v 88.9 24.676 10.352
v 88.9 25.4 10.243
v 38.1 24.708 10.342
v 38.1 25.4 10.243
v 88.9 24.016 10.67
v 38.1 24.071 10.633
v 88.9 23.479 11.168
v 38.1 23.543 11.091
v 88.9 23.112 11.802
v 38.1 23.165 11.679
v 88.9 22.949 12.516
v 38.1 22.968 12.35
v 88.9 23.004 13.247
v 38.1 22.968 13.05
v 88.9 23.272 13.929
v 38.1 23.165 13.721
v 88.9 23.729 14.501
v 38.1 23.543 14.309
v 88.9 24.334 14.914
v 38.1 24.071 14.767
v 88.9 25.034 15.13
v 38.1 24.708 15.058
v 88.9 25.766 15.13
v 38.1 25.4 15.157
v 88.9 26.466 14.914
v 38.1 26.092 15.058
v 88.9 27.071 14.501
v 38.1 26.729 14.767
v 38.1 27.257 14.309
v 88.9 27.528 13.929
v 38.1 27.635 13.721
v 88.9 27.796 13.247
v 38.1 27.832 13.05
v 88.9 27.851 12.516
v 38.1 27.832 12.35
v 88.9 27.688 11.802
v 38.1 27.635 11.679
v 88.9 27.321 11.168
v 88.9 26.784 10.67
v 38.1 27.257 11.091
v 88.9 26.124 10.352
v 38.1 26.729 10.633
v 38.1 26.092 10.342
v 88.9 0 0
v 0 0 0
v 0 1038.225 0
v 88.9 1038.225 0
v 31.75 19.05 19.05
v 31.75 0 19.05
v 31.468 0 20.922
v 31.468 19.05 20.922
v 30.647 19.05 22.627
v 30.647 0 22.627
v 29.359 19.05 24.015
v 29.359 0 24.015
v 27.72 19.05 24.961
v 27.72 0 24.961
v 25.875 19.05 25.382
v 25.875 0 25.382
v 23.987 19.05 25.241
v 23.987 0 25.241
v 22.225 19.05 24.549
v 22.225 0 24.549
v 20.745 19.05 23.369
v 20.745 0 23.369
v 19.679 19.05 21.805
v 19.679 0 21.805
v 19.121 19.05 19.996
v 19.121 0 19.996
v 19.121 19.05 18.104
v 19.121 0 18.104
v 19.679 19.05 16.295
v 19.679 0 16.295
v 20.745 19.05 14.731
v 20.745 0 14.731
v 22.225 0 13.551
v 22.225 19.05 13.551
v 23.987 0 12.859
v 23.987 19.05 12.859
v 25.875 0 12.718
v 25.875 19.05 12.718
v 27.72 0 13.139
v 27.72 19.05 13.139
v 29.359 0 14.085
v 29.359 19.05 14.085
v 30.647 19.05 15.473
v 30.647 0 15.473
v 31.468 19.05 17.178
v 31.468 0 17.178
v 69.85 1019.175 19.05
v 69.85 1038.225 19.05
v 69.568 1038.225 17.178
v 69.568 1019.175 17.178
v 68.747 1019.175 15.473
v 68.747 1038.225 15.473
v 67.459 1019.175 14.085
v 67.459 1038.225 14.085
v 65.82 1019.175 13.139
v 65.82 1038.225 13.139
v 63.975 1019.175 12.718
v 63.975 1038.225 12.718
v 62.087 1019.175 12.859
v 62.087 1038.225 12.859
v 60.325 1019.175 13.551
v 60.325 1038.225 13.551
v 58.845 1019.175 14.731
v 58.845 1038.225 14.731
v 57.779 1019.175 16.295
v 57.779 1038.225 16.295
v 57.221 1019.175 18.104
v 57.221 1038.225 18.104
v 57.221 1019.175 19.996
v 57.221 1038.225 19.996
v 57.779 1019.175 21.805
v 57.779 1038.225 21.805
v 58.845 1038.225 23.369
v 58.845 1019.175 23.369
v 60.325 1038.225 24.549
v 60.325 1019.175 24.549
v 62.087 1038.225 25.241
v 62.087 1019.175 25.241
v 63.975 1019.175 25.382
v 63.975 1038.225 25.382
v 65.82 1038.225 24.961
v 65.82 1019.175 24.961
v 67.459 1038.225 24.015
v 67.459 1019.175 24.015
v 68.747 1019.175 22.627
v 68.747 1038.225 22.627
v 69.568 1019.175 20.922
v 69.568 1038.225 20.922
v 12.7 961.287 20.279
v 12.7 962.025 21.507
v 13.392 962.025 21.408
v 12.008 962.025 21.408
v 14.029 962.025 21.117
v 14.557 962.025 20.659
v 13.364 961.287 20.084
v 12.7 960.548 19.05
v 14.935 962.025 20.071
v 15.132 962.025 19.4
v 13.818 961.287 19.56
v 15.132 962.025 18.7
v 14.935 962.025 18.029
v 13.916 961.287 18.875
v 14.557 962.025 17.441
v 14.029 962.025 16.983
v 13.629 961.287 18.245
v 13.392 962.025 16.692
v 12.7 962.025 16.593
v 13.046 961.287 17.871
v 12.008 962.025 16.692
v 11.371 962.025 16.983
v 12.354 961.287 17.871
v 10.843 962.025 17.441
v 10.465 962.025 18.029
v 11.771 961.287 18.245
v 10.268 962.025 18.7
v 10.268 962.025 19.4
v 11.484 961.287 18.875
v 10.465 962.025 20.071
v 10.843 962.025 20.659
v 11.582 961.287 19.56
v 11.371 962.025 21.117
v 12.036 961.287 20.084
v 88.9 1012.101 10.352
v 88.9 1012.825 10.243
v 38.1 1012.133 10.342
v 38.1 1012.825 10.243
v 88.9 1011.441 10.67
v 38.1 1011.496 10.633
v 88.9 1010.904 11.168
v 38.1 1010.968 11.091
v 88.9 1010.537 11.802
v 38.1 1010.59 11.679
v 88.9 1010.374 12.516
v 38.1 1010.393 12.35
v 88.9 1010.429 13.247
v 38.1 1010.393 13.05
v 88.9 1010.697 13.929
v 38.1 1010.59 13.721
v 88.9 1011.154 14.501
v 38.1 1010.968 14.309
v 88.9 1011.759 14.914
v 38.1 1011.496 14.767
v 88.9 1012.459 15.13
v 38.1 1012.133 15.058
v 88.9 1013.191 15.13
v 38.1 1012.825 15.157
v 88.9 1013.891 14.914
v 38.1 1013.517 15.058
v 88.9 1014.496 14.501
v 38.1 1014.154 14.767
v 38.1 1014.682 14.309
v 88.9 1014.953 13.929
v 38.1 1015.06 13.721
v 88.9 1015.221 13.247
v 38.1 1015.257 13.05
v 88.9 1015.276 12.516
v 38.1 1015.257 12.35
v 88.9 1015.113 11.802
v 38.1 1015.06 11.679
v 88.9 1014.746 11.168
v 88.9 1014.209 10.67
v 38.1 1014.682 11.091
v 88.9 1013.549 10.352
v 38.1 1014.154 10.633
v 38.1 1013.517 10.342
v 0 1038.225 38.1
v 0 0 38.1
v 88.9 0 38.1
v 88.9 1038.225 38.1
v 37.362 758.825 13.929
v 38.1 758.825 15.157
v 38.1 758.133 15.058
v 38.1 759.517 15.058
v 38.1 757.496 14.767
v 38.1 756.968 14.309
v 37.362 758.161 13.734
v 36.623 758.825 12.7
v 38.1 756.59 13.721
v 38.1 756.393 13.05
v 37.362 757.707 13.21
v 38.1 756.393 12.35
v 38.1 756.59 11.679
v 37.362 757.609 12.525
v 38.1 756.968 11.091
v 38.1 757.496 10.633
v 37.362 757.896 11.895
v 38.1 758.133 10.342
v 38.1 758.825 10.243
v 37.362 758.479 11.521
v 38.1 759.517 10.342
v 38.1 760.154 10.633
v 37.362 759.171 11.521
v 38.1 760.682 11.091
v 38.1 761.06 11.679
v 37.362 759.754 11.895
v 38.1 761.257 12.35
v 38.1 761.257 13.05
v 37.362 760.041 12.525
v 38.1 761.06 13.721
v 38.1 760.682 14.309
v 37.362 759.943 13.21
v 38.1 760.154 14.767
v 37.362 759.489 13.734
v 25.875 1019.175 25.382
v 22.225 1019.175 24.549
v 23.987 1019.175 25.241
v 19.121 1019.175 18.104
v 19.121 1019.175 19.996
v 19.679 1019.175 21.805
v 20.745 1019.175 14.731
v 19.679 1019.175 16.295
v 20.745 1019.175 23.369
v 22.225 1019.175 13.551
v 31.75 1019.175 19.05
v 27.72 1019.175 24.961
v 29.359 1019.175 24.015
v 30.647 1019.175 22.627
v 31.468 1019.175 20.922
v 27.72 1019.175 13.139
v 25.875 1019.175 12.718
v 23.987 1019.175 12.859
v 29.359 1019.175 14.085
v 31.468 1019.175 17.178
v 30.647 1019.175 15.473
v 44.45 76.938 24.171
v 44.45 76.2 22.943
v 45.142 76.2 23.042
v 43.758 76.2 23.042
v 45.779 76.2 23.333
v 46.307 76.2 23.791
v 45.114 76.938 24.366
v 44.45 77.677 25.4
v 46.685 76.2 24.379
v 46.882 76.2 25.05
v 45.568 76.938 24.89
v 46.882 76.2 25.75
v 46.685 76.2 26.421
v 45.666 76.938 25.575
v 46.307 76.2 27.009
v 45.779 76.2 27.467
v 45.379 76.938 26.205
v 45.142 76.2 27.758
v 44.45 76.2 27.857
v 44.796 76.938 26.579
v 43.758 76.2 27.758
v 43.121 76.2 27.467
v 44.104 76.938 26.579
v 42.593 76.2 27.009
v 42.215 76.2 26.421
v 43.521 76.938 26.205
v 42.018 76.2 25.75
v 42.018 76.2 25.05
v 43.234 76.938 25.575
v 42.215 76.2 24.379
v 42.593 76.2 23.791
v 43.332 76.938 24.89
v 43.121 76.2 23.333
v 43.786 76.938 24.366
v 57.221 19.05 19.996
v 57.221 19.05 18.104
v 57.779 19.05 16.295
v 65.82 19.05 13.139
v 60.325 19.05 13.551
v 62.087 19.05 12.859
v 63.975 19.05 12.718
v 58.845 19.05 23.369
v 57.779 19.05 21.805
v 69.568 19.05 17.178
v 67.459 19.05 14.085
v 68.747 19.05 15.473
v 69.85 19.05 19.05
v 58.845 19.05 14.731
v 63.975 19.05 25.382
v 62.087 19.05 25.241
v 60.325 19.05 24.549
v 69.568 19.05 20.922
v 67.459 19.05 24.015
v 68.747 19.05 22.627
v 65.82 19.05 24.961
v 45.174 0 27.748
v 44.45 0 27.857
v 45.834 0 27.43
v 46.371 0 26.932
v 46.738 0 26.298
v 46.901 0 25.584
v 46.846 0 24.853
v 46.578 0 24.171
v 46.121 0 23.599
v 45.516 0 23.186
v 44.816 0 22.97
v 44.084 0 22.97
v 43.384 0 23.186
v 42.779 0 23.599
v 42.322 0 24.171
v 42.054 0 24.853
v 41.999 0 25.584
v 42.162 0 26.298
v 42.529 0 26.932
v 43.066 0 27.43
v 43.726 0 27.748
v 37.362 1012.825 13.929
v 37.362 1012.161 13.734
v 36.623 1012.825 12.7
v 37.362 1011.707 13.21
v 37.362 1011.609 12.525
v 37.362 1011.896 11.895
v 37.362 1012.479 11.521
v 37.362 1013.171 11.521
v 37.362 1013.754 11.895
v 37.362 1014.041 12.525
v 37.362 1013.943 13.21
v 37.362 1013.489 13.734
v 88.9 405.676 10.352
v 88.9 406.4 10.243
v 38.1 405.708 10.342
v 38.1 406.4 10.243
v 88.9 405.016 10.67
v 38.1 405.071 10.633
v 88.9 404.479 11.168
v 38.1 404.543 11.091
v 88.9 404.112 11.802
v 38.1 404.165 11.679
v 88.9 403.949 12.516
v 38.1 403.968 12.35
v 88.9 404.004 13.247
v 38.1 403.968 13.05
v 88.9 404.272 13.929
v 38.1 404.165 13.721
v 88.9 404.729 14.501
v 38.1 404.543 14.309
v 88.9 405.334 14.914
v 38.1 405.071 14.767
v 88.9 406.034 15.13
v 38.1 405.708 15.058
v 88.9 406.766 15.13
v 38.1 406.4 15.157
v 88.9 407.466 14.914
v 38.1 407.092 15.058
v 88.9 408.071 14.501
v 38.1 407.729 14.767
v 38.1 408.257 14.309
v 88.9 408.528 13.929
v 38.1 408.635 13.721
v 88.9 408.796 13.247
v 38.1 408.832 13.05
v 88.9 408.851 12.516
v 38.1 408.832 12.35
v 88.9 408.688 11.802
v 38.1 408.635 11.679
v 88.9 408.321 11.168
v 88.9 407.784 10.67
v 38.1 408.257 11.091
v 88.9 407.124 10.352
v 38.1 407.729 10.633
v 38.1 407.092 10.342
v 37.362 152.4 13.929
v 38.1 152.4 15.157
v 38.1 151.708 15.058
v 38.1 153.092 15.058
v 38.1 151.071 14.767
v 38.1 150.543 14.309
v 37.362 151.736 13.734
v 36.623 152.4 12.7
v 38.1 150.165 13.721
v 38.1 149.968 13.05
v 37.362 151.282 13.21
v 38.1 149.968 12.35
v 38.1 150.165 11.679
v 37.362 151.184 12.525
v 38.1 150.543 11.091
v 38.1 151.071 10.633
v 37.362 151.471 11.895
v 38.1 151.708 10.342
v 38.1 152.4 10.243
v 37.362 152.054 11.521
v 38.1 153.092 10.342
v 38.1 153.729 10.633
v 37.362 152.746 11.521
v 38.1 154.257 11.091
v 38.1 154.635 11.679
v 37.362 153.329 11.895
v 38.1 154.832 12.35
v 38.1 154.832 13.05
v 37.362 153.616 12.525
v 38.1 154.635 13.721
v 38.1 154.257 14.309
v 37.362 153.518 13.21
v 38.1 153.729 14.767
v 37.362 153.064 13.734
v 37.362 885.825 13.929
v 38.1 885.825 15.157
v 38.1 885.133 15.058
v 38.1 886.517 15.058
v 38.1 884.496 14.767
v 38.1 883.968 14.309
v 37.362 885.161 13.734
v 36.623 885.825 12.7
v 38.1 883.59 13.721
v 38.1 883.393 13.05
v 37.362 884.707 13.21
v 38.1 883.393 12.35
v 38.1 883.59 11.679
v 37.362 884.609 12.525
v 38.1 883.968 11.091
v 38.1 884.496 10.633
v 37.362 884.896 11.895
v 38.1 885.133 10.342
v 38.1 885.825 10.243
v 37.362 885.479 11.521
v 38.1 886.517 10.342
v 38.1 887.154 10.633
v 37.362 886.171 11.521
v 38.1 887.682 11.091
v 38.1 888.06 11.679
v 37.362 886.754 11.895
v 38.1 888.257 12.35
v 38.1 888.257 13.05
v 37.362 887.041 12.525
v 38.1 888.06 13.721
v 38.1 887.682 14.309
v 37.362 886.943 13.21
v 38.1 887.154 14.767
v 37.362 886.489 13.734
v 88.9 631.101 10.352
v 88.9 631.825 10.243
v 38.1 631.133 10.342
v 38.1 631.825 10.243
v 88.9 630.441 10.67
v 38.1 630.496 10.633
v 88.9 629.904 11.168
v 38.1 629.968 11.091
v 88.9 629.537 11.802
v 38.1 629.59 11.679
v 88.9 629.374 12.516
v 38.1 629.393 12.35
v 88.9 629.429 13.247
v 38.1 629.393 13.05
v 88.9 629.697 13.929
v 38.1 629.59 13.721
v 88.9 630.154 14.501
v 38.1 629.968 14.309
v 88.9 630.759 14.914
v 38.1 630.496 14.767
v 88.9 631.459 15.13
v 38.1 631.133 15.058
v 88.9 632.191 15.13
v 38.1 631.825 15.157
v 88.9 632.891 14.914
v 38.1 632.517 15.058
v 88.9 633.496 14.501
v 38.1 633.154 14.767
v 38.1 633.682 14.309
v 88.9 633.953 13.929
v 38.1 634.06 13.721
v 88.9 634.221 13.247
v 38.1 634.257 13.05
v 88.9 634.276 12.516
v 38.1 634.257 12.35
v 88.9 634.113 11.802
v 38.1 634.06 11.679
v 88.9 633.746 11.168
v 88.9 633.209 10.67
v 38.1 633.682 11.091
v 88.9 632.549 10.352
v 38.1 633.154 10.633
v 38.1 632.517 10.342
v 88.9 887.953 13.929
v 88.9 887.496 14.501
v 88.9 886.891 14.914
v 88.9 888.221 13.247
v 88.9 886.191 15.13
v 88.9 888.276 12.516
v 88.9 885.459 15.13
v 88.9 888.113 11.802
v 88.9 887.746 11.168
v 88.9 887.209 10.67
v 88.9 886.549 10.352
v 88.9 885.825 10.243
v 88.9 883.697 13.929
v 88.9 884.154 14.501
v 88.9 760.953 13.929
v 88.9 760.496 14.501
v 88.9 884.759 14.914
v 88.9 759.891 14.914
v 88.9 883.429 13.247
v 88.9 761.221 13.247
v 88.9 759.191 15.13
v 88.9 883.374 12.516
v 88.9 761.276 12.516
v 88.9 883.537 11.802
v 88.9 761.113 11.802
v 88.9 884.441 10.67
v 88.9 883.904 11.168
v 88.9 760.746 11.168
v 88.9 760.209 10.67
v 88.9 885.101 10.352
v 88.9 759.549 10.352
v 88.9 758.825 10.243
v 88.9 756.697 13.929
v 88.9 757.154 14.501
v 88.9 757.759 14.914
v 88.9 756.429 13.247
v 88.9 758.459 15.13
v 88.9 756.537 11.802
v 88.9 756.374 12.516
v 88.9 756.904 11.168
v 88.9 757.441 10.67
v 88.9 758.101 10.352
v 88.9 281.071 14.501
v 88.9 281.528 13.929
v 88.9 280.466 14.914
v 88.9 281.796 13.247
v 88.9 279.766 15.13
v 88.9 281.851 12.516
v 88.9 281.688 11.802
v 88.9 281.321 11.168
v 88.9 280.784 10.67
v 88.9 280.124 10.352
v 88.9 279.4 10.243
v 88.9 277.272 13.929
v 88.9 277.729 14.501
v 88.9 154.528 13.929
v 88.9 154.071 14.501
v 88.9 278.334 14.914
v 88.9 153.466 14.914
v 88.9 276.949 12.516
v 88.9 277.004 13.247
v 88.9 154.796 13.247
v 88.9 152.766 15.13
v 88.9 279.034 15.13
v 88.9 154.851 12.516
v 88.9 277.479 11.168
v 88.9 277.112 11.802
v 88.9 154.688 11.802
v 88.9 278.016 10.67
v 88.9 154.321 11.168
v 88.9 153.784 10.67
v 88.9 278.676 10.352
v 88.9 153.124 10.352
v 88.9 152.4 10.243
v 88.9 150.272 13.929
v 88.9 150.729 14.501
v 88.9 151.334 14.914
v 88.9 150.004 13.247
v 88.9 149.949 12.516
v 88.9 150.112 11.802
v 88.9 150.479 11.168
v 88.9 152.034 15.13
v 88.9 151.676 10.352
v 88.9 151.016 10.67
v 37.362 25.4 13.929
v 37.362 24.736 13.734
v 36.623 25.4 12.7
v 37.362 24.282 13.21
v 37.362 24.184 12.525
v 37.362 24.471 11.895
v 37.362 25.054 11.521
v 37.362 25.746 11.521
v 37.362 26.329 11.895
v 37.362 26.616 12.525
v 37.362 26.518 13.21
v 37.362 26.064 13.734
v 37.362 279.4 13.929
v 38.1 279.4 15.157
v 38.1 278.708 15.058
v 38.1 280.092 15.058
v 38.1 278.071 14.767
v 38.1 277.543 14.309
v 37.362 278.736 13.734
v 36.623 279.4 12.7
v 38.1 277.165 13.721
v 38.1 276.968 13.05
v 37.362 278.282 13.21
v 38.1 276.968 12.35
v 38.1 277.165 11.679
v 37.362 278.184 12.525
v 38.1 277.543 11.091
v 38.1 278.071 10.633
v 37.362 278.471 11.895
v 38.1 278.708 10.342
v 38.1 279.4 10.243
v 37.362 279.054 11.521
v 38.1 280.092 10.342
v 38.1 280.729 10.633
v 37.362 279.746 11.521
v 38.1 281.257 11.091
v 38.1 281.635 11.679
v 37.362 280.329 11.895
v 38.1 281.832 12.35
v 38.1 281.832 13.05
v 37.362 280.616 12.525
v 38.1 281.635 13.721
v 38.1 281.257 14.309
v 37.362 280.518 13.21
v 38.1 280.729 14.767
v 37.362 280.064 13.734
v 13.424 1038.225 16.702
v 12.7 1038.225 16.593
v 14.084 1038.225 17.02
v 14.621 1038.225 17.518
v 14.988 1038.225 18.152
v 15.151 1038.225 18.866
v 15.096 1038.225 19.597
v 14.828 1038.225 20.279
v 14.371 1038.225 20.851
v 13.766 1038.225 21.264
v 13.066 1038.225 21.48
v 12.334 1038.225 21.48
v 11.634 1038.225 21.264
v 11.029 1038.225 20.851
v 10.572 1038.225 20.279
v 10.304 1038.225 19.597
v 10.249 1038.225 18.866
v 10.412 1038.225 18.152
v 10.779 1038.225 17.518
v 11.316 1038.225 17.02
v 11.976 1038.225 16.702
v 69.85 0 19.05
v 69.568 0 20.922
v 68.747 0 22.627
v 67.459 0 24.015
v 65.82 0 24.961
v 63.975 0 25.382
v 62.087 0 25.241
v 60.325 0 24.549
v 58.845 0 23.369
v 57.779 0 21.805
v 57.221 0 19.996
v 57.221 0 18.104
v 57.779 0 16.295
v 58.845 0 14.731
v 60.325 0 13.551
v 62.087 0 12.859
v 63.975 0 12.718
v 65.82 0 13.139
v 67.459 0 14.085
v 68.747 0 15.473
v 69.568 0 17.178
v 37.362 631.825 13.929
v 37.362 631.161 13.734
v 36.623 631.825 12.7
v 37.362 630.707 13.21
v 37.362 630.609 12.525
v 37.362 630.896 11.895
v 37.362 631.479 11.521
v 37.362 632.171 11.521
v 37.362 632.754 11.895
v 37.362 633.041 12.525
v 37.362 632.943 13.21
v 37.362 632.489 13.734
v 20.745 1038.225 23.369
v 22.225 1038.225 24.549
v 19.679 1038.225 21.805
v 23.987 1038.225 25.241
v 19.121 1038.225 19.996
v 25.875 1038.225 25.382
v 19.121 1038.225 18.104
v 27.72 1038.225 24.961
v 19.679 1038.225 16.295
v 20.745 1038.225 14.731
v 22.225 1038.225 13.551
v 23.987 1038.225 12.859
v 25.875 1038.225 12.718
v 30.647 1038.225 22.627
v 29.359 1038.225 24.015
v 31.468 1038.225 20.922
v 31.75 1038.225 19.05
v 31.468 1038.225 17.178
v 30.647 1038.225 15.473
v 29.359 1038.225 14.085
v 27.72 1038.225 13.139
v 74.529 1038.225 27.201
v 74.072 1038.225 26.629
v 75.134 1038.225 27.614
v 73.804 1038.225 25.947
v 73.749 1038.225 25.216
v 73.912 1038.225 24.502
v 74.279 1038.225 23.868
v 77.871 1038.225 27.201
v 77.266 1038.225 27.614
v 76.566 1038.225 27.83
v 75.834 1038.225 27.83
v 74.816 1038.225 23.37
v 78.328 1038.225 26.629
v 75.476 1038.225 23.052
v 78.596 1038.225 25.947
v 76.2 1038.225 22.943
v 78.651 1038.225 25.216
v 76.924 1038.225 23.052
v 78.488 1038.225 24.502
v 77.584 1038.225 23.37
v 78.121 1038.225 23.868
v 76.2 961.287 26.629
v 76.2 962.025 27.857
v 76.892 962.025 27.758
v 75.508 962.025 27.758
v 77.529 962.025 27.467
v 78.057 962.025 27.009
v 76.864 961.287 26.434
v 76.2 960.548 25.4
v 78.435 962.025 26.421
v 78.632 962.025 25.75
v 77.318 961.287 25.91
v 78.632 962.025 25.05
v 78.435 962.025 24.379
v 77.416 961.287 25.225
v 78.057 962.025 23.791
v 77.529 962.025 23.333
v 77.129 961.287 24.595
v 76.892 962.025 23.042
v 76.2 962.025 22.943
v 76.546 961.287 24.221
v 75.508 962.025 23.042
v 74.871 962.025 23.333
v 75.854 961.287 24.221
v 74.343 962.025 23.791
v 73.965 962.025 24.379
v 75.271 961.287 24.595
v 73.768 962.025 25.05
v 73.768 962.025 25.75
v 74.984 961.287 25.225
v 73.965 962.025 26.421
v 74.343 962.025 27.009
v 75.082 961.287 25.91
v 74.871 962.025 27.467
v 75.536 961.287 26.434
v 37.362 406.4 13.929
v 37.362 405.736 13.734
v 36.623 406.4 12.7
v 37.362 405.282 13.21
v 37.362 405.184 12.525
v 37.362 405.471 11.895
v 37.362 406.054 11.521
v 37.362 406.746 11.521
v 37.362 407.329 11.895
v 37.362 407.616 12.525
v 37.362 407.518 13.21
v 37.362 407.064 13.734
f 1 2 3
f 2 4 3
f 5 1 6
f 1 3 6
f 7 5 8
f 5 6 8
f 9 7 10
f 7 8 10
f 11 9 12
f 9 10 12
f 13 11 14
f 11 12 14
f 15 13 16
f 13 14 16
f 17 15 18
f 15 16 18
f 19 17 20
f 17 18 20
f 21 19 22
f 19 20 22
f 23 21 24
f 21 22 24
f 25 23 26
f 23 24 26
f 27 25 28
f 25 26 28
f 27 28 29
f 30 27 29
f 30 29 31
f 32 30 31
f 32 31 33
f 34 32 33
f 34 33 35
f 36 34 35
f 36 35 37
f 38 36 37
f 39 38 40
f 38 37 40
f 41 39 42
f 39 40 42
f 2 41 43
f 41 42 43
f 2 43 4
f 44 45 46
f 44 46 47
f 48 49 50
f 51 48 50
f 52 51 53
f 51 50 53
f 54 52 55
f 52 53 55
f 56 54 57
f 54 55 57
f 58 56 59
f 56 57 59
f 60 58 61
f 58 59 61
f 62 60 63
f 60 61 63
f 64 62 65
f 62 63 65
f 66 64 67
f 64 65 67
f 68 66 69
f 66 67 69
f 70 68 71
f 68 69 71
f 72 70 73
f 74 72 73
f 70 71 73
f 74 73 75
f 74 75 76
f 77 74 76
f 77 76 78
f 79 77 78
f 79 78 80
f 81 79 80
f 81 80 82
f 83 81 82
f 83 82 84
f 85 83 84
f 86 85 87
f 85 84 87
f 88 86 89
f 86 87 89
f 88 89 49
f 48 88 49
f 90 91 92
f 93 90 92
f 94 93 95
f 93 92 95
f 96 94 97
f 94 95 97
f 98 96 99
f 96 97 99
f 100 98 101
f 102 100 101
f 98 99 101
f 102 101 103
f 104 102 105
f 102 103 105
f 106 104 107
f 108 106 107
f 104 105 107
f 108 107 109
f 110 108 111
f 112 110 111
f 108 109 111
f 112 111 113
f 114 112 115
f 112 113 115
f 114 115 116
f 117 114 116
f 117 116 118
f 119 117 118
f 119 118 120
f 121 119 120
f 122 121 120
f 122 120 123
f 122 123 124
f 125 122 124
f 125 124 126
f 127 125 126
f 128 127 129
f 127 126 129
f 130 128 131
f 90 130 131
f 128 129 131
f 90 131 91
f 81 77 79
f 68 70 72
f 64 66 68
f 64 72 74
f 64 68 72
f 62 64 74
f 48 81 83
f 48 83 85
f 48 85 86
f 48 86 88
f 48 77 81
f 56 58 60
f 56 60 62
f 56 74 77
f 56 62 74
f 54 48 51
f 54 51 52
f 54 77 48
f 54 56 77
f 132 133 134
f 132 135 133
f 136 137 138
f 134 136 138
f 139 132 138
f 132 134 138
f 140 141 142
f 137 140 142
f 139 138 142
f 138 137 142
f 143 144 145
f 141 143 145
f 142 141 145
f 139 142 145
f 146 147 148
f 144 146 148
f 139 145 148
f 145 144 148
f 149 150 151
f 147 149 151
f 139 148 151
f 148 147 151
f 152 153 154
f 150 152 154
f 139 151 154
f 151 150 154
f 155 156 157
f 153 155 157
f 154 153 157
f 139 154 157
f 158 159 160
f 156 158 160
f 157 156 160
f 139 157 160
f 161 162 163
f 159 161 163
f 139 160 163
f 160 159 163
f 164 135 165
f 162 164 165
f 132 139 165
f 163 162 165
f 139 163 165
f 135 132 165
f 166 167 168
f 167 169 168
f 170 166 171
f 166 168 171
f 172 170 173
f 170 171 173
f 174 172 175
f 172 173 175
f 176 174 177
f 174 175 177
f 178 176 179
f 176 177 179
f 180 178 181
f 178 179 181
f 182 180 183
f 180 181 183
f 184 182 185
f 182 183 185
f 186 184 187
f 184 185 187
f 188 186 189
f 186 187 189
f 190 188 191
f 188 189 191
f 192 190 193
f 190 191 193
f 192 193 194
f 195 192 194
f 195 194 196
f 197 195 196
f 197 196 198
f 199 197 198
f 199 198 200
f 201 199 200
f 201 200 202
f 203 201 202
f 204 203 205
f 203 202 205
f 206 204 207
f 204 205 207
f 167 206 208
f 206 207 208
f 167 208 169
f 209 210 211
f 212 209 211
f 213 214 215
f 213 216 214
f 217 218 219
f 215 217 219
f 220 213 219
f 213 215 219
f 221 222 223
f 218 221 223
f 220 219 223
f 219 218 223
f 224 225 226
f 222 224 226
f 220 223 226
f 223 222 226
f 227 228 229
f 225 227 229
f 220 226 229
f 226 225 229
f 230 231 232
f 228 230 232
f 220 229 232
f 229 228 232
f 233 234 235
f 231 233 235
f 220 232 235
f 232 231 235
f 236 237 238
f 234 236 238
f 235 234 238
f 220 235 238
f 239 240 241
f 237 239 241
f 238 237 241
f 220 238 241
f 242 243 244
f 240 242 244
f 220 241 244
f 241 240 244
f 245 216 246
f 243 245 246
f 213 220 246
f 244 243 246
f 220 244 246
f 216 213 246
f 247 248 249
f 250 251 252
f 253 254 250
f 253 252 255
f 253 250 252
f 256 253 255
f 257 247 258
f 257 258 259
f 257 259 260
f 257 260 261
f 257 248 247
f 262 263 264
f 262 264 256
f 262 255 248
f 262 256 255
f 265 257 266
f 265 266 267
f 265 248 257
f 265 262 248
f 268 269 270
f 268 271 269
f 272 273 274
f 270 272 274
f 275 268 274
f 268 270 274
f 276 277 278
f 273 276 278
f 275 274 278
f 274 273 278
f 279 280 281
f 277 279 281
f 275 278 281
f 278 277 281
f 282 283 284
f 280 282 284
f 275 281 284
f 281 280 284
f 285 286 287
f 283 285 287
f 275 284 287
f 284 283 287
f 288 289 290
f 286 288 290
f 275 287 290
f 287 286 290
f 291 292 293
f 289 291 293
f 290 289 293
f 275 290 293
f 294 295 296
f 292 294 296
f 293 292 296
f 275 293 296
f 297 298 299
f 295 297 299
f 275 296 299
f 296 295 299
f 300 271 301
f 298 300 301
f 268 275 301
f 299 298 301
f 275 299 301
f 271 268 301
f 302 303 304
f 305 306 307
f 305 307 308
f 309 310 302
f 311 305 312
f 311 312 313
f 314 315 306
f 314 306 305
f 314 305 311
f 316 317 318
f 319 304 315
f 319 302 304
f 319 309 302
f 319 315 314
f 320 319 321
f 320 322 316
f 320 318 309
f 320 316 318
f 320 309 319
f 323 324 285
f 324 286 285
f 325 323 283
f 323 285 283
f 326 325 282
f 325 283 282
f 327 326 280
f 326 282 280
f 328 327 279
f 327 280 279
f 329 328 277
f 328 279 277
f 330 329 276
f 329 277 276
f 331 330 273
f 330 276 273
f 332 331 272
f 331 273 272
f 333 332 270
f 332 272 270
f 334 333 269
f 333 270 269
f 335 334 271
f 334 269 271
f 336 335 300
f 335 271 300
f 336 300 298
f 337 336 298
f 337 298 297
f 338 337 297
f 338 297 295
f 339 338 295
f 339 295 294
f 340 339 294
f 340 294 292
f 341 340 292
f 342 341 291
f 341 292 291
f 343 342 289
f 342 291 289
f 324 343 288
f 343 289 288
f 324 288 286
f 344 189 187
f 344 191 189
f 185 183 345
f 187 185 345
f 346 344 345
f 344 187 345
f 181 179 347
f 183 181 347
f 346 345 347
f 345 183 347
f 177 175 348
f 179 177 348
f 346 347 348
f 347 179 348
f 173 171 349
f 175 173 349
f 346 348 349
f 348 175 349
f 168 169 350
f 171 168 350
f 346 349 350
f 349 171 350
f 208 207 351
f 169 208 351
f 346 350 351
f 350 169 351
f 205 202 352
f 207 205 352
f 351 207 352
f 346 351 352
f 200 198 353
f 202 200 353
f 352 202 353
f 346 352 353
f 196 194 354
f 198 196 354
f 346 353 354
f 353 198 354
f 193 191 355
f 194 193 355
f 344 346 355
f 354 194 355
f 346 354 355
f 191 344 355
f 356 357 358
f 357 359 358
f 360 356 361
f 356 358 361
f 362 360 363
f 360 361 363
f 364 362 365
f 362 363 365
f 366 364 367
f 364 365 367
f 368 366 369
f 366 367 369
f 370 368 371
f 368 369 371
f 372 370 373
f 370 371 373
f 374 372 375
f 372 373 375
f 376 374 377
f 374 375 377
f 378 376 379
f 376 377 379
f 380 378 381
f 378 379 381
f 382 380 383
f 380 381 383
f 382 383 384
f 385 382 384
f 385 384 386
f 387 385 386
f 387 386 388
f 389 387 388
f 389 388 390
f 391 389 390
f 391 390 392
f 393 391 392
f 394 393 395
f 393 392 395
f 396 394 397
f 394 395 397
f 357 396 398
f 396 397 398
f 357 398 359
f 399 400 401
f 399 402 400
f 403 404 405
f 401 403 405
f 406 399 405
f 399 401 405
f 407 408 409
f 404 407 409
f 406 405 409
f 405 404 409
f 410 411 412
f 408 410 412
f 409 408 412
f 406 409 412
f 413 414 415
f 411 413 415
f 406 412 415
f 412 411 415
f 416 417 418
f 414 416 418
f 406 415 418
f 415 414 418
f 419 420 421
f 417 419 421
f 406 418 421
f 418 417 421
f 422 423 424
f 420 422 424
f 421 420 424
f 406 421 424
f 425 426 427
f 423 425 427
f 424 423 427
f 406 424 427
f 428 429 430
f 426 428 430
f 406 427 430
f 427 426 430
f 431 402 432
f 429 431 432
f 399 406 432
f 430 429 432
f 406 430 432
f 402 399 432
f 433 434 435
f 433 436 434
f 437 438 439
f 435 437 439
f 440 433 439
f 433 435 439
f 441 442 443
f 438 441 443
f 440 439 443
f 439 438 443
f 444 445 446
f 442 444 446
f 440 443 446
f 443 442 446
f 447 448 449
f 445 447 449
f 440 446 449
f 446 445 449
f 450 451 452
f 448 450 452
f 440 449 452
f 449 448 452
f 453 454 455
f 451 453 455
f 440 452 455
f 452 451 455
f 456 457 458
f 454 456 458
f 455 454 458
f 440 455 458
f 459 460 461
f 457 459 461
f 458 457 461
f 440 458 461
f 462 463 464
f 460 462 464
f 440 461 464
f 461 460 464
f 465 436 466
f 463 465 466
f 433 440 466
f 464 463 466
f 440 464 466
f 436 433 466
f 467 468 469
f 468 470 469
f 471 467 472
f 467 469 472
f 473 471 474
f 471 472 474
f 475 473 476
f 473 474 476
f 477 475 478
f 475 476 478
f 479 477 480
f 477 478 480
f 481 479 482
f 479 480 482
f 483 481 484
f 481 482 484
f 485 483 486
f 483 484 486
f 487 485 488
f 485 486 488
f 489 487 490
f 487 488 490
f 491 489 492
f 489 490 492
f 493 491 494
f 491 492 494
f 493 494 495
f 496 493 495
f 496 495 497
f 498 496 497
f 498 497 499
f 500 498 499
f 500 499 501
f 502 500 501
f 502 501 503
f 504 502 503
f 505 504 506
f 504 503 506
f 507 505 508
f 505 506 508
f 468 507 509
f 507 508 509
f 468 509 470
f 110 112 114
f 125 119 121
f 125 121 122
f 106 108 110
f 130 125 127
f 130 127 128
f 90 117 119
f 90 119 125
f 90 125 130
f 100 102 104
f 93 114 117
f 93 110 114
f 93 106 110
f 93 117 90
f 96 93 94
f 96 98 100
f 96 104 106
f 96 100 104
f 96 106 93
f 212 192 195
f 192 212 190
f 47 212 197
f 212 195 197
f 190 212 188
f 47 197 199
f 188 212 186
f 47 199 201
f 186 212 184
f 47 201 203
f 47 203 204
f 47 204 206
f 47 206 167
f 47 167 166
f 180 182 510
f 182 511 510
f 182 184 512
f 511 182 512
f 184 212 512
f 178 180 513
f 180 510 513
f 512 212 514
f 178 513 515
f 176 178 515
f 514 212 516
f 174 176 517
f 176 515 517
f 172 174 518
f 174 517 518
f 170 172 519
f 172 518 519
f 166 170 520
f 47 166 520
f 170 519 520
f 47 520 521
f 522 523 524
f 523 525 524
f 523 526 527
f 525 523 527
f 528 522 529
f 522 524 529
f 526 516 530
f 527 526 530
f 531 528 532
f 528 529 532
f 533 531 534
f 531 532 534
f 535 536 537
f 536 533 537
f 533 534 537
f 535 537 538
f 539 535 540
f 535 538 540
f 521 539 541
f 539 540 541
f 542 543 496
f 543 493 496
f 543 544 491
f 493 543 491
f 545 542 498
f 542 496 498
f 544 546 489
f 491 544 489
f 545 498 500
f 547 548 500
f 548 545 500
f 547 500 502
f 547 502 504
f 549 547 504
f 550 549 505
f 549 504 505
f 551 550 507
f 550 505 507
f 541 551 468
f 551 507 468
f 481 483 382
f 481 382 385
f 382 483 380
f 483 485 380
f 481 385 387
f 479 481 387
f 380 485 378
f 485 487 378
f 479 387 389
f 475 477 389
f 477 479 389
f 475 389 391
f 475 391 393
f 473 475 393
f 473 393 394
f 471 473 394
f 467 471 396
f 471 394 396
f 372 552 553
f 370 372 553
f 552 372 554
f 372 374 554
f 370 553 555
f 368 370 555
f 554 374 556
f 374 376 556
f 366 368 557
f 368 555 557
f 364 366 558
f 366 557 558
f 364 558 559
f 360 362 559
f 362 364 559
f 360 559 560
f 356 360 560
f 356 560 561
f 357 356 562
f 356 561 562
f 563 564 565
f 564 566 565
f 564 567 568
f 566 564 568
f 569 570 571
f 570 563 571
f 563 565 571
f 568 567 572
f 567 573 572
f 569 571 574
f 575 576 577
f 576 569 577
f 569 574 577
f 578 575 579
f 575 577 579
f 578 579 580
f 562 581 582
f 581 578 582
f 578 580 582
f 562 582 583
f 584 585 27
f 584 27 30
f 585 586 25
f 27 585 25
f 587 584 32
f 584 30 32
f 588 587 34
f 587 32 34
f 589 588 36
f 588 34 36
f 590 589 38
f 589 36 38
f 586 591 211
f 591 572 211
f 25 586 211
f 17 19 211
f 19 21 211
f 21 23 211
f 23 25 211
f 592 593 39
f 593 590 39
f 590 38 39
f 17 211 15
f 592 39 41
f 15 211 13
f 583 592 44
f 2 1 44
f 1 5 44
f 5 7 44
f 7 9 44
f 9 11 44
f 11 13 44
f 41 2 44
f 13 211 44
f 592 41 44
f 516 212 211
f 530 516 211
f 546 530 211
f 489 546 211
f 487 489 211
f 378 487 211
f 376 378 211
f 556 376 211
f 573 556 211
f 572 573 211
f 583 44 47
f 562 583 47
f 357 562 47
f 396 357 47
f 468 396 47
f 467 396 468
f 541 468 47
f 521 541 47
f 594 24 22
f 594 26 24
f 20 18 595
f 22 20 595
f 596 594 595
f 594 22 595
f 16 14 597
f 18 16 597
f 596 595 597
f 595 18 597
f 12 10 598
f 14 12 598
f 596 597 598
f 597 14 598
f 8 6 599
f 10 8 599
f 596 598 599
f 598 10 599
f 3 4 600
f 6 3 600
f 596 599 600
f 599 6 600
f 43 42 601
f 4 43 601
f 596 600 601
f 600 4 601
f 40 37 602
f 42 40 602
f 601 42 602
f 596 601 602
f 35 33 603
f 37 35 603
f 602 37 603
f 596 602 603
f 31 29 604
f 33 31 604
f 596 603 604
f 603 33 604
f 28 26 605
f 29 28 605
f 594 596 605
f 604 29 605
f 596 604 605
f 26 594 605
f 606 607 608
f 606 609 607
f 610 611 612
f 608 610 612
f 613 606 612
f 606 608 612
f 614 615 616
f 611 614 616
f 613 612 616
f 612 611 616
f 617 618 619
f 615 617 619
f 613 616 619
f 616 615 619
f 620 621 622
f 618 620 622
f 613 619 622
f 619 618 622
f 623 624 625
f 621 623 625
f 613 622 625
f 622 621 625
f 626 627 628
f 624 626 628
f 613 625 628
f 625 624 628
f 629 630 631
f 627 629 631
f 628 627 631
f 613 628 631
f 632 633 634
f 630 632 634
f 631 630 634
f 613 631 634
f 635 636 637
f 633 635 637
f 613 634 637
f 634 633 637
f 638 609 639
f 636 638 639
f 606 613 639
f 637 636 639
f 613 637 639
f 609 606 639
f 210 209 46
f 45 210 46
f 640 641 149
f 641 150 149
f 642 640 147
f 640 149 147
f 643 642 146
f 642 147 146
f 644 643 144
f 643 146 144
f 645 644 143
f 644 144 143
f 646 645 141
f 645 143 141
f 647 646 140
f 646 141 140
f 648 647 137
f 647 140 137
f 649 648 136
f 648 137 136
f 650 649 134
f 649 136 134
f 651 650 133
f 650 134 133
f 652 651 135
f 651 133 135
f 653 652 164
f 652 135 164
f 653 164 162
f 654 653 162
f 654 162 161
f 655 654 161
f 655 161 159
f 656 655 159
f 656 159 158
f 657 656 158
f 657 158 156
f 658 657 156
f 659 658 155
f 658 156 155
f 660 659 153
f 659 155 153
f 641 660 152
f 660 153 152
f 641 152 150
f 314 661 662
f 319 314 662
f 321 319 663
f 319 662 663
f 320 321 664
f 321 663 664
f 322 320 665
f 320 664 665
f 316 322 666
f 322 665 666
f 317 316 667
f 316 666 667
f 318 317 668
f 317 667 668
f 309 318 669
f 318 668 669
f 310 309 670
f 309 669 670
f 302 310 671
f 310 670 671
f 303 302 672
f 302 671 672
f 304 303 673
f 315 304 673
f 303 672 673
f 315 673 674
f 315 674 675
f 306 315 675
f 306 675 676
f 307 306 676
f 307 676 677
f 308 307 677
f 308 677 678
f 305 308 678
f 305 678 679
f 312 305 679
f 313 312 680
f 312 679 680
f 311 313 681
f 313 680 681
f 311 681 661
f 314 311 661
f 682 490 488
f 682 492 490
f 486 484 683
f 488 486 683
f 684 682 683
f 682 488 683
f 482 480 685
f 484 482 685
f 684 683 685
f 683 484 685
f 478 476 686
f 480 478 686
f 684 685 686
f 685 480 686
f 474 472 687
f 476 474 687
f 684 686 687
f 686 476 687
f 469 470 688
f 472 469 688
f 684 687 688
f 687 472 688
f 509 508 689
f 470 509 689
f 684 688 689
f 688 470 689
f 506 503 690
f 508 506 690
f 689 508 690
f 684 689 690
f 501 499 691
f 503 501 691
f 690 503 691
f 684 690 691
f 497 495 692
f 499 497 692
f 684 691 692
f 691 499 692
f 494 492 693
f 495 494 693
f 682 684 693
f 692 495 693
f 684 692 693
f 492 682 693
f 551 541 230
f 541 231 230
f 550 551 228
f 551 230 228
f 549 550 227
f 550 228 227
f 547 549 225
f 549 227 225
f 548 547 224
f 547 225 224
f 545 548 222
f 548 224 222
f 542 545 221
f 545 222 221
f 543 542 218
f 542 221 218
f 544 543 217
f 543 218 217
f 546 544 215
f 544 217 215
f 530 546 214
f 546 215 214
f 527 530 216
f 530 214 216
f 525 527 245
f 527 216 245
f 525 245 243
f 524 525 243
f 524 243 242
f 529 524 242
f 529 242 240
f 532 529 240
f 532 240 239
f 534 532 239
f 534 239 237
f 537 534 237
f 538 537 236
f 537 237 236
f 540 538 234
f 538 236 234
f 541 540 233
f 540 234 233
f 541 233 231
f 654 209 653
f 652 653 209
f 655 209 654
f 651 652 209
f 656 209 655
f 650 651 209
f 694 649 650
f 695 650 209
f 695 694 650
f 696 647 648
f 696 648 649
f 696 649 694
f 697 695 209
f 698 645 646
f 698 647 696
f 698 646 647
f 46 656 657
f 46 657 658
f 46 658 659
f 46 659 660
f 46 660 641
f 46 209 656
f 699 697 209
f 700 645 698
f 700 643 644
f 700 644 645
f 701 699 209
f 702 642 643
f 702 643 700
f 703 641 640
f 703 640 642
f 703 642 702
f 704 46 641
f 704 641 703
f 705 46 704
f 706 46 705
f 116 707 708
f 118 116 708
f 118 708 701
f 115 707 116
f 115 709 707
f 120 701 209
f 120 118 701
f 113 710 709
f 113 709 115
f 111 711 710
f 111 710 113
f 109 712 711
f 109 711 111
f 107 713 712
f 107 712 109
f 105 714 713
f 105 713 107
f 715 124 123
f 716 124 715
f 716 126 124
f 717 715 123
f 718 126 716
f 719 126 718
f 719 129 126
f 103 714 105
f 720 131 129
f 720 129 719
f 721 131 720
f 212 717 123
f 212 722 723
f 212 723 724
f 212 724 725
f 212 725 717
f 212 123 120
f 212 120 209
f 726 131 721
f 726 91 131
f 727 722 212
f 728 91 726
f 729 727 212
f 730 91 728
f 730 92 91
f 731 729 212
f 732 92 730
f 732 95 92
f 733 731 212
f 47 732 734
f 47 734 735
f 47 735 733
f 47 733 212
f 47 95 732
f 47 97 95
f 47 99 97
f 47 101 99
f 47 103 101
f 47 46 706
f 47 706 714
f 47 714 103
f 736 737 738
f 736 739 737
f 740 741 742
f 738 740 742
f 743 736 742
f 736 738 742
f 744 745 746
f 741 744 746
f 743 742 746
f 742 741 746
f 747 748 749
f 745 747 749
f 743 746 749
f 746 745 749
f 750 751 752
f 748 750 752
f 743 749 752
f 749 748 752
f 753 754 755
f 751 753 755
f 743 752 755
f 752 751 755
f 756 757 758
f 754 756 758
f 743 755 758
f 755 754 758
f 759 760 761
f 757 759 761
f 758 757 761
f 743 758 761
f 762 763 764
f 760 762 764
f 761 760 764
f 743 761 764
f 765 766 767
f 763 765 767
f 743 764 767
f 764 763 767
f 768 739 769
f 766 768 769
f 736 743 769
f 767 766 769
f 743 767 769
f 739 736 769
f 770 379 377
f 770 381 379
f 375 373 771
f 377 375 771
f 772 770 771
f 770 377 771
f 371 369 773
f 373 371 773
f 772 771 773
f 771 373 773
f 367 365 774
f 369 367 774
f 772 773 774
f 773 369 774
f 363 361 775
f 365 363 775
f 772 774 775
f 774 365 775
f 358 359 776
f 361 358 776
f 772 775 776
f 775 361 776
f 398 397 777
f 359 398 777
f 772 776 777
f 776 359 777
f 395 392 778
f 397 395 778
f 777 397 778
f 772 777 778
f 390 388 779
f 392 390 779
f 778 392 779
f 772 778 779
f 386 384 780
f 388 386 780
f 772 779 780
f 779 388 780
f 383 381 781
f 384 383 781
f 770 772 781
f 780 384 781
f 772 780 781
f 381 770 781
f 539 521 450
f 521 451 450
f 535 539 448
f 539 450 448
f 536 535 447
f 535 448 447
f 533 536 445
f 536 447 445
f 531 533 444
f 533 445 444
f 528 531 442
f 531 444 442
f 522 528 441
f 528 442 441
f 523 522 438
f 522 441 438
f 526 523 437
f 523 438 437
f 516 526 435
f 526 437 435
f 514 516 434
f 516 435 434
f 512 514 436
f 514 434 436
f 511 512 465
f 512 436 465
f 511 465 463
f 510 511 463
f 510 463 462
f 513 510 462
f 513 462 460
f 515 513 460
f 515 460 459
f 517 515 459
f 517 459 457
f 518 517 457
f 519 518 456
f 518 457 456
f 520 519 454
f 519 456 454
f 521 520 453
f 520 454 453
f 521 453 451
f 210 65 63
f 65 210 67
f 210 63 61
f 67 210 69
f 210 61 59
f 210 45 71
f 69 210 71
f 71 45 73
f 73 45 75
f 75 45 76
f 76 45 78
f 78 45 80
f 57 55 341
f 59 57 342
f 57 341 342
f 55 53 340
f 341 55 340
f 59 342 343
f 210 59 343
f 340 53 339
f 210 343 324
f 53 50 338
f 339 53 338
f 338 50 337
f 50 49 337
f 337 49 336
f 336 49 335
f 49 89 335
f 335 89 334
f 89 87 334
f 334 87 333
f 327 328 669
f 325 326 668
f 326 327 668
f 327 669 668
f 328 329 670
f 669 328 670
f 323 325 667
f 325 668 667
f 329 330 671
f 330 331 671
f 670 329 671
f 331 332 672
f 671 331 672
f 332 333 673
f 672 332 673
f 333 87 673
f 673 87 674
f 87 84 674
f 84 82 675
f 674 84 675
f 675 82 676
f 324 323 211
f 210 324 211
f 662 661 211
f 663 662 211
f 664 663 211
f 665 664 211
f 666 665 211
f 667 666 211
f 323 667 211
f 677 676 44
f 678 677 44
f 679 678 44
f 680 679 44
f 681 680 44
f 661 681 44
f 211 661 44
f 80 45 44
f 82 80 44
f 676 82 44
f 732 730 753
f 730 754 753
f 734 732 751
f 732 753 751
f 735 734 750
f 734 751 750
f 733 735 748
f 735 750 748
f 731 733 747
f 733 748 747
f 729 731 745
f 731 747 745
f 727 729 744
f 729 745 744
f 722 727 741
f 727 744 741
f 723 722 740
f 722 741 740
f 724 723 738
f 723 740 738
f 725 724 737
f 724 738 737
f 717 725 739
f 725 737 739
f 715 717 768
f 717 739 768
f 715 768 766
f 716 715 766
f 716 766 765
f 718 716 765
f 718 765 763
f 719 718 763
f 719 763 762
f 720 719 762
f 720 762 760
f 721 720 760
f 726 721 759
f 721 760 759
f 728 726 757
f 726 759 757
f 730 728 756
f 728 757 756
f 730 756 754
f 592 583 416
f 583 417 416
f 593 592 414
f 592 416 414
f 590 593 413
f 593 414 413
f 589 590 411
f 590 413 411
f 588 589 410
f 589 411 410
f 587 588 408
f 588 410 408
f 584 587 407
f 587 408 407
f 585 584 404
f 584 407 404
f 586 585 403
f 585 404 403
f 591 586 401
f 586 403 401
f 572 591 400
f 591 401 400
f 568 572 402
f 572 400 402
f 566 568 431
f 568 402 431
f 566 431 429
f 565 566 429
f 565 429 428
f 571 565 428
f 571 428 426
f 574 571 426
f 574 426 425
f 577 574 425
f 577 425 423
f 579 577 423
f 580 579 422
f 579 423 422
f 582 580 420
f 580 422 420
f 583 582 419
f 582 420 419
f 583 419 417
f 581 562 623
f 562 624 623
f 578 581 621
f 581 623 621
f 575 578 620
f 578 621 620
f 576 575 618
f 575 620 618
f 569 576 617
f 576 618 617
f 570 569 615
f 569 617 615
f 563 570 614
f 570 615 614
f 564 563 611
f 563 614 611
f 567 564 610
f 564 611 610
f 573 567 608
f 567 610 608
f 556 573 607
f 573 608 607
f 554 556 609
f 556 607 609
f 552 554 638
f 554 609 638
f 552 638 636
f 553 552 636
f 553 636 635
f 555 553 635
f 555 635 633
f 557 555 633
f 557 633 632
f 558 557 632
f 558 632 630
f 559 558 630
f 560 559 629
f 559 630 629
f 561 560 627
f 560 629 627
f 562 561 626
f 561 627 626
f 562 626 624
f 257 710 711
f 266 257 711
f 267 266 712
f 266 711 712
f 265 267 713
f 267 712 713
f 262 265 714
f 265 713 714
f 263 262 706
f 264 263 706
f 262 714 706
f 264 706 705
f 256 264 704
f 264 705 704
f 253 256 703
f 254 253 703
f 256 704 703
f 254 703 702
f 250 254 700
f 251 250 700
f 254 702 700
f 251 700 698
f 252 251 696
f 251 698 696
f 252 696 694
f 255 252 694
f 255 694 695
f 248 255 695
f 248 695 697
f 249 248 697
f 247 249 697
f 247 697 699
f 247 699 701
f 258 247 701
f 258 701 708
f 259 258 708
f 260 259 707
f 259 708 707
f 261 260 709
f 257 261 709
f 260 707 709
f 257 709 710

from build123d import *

# Parameters (mm, degrees)
SKETCH1_W                                  = 88.9
SKETCH1_H                                  = 38.1
BOSS_EXTRUDE1_DEPTH                        = 1038.225
SKETCH2_R                                  = 6.35
CUT_EXTRUDE1_DEPTH                         = 19.05
SKETCH3_R                                  = 6.35
CUT_EXTRUDE2_DEPTH                         = 19.05
F_10_0_1935_DIAMETER_HOLE1_D               = 4.9149
F_10_0_1935_DIAMETER_HOLE1_DEPTH           = 76.2
F_10_0_1935_DIAMETER_HOLE1_TIP             = 1.476584928
F_10_0_1935_DIAMETER_HOLE1_ON_FACE_2_D     = 4.9149
F_10_0_1935_DIAMETER_HOLE1_ON_FACE_2_DEPTH = 76.2
F_10_0_1935_DIAMETER_HOLE1_ON_FACE_2_TIP   = 1.476584928
F_10_0_1935_DIAMETER_HOLE2_D               = 4.9149
F_10_0_1935_DIAMETER_HOLE2_DEPTH           = 50.8
F_10_0_1935_DIAMETER_HOLE2_TIP             = 1.476584928


with BuildPart() as part:
    # Sketch1 → Boss-Extrude1 (new body)
    with BuildSketch(Plane(origin=(0, 0, 0), x_dir=(1, 0, 0), z_dir=(0, 1, 0))):
        with Locations((44.45, -19.05)):
            Rectangle(SKETCH1_W, SKETCH1_H)
    extrude(amount=BOSS_EXTRUDE1_DEPTH)

    # Sketch2 → Cut-Extrude1 (cut)
    with BuildSketch(Plane(origin=(0, 1038.225, 0), x_dir=(1, 0, 0), z_dir=(0, 1, 0))):
        with Locations((25.4, -19.05)):
            Circle(SKETCH2_R)
        with Locations((63.5, -19.05)):
            Circle(SKETCH2_R)
    extrude(amount=-CUT_EXTRUDE1_DEPTH, mode=Mode.SUBTRACT)

    # Sketch3 → Cut-Extrude2 (cut)
    with BuildSketch(Plane.XZ):
        with Locations((25.4, 19.05)):
            Circle(SKETCH3_R)
        with Locations((63.5, 19.05)):
            Circle(SKETCH3_R)
    extrude(amount=-CUT_EXTRUDE2_DEPTH, mode=Mode.SUBTRACT)

    # #10 (0.1935) Diameter Hole1
    with Locations(Plane(origin=(44.45, 0, 25.4), x_dir=(0, 0, -1), z_dir=(0, -1, 0))):
        with Locations((0, 0)):
            Hole(F_10_0_1935_DIAMETER_HOLE1_D / 2, depth=F_10_0_1935_DIAMETER_HOLE1_DEPTH)
            with Locations((0, 0, -(F_10_0_1935_DIAMETER_HOLE1_DEPTH + F_10_0_1935_DIAMETER_HOLE1_TIP / 2))):  # 118° drill point
                Cone(0, F_10_0_1935_DIAMETER_HOLE1_D / 2, F_10_0_1935_DIAMETER_HOLE1_TIP, mode=Mode.SUBTRACT)

    # #10 (0.1935) Diameter Hole1 on face 2
    with Locations(Plane(origin=(12.7, 1038.225, 19.05), x_dir=(0, 0, 1), z_dir=(0, 1, 0))):
        with Locations((0, 0), (6.35, 63.5)):
            Hole(F_10_0_1935_DIAMETER_HOLE1_ON_FACE_2_D / 2, depth=F_10_0_1935_DIAMETER_HOLE1_ON_FACE_2_DEPTH)
            with Locations((0, 0, -(F_10_0_1935_DIAMETER_HOLE1_ON_FACE_2_DEPTH + F_10_0_1935_DIAMETER_HOLE1_ON_FACE_2_TIP / 2))):  # 118° drill point
                Cone(0, F_10_0_1935_DIAMETER_HOLE1_ON_FACE_2_D / 2, F_10_0_1935_DIAMETER_HOLE1_ON_FACE_2_TIP, mode=Mode.SUBTRACT)

    # #10 (0.1935) Diameter Hole2
    with Locations(Plane(origin=(88.9, 25.4, 12.7), x_dir=(0, 0, 1), z_dir=(1, 0, 0))):
        with Locations((0, 0), (0, -127), (0, -254), (0, -381), (0, -606.425), (0, -733.425), (0, -860.425), (0, -987.425)):
            Hole(F_10_0_1935_DIAMETER_HOLE2_D / 2, depth=F_10_0_1935_DIAMETER_HOLE2_DEPTH)
            with Locations((0, 0, -(F_10_0_1935_DIAMETER_HOLE2_DEPTH + F_10_0_1935_DIAMETER_HOLE2_TIP / 2))):  # 118° drill point
                Cone(0, F_10_0_1935_DIAMETER_HOLE2_D / 2, F_10_0_1935_DIAMETER_HOLE2_TIP, mode=Mode.SUBTRACT)


solid = part.part
